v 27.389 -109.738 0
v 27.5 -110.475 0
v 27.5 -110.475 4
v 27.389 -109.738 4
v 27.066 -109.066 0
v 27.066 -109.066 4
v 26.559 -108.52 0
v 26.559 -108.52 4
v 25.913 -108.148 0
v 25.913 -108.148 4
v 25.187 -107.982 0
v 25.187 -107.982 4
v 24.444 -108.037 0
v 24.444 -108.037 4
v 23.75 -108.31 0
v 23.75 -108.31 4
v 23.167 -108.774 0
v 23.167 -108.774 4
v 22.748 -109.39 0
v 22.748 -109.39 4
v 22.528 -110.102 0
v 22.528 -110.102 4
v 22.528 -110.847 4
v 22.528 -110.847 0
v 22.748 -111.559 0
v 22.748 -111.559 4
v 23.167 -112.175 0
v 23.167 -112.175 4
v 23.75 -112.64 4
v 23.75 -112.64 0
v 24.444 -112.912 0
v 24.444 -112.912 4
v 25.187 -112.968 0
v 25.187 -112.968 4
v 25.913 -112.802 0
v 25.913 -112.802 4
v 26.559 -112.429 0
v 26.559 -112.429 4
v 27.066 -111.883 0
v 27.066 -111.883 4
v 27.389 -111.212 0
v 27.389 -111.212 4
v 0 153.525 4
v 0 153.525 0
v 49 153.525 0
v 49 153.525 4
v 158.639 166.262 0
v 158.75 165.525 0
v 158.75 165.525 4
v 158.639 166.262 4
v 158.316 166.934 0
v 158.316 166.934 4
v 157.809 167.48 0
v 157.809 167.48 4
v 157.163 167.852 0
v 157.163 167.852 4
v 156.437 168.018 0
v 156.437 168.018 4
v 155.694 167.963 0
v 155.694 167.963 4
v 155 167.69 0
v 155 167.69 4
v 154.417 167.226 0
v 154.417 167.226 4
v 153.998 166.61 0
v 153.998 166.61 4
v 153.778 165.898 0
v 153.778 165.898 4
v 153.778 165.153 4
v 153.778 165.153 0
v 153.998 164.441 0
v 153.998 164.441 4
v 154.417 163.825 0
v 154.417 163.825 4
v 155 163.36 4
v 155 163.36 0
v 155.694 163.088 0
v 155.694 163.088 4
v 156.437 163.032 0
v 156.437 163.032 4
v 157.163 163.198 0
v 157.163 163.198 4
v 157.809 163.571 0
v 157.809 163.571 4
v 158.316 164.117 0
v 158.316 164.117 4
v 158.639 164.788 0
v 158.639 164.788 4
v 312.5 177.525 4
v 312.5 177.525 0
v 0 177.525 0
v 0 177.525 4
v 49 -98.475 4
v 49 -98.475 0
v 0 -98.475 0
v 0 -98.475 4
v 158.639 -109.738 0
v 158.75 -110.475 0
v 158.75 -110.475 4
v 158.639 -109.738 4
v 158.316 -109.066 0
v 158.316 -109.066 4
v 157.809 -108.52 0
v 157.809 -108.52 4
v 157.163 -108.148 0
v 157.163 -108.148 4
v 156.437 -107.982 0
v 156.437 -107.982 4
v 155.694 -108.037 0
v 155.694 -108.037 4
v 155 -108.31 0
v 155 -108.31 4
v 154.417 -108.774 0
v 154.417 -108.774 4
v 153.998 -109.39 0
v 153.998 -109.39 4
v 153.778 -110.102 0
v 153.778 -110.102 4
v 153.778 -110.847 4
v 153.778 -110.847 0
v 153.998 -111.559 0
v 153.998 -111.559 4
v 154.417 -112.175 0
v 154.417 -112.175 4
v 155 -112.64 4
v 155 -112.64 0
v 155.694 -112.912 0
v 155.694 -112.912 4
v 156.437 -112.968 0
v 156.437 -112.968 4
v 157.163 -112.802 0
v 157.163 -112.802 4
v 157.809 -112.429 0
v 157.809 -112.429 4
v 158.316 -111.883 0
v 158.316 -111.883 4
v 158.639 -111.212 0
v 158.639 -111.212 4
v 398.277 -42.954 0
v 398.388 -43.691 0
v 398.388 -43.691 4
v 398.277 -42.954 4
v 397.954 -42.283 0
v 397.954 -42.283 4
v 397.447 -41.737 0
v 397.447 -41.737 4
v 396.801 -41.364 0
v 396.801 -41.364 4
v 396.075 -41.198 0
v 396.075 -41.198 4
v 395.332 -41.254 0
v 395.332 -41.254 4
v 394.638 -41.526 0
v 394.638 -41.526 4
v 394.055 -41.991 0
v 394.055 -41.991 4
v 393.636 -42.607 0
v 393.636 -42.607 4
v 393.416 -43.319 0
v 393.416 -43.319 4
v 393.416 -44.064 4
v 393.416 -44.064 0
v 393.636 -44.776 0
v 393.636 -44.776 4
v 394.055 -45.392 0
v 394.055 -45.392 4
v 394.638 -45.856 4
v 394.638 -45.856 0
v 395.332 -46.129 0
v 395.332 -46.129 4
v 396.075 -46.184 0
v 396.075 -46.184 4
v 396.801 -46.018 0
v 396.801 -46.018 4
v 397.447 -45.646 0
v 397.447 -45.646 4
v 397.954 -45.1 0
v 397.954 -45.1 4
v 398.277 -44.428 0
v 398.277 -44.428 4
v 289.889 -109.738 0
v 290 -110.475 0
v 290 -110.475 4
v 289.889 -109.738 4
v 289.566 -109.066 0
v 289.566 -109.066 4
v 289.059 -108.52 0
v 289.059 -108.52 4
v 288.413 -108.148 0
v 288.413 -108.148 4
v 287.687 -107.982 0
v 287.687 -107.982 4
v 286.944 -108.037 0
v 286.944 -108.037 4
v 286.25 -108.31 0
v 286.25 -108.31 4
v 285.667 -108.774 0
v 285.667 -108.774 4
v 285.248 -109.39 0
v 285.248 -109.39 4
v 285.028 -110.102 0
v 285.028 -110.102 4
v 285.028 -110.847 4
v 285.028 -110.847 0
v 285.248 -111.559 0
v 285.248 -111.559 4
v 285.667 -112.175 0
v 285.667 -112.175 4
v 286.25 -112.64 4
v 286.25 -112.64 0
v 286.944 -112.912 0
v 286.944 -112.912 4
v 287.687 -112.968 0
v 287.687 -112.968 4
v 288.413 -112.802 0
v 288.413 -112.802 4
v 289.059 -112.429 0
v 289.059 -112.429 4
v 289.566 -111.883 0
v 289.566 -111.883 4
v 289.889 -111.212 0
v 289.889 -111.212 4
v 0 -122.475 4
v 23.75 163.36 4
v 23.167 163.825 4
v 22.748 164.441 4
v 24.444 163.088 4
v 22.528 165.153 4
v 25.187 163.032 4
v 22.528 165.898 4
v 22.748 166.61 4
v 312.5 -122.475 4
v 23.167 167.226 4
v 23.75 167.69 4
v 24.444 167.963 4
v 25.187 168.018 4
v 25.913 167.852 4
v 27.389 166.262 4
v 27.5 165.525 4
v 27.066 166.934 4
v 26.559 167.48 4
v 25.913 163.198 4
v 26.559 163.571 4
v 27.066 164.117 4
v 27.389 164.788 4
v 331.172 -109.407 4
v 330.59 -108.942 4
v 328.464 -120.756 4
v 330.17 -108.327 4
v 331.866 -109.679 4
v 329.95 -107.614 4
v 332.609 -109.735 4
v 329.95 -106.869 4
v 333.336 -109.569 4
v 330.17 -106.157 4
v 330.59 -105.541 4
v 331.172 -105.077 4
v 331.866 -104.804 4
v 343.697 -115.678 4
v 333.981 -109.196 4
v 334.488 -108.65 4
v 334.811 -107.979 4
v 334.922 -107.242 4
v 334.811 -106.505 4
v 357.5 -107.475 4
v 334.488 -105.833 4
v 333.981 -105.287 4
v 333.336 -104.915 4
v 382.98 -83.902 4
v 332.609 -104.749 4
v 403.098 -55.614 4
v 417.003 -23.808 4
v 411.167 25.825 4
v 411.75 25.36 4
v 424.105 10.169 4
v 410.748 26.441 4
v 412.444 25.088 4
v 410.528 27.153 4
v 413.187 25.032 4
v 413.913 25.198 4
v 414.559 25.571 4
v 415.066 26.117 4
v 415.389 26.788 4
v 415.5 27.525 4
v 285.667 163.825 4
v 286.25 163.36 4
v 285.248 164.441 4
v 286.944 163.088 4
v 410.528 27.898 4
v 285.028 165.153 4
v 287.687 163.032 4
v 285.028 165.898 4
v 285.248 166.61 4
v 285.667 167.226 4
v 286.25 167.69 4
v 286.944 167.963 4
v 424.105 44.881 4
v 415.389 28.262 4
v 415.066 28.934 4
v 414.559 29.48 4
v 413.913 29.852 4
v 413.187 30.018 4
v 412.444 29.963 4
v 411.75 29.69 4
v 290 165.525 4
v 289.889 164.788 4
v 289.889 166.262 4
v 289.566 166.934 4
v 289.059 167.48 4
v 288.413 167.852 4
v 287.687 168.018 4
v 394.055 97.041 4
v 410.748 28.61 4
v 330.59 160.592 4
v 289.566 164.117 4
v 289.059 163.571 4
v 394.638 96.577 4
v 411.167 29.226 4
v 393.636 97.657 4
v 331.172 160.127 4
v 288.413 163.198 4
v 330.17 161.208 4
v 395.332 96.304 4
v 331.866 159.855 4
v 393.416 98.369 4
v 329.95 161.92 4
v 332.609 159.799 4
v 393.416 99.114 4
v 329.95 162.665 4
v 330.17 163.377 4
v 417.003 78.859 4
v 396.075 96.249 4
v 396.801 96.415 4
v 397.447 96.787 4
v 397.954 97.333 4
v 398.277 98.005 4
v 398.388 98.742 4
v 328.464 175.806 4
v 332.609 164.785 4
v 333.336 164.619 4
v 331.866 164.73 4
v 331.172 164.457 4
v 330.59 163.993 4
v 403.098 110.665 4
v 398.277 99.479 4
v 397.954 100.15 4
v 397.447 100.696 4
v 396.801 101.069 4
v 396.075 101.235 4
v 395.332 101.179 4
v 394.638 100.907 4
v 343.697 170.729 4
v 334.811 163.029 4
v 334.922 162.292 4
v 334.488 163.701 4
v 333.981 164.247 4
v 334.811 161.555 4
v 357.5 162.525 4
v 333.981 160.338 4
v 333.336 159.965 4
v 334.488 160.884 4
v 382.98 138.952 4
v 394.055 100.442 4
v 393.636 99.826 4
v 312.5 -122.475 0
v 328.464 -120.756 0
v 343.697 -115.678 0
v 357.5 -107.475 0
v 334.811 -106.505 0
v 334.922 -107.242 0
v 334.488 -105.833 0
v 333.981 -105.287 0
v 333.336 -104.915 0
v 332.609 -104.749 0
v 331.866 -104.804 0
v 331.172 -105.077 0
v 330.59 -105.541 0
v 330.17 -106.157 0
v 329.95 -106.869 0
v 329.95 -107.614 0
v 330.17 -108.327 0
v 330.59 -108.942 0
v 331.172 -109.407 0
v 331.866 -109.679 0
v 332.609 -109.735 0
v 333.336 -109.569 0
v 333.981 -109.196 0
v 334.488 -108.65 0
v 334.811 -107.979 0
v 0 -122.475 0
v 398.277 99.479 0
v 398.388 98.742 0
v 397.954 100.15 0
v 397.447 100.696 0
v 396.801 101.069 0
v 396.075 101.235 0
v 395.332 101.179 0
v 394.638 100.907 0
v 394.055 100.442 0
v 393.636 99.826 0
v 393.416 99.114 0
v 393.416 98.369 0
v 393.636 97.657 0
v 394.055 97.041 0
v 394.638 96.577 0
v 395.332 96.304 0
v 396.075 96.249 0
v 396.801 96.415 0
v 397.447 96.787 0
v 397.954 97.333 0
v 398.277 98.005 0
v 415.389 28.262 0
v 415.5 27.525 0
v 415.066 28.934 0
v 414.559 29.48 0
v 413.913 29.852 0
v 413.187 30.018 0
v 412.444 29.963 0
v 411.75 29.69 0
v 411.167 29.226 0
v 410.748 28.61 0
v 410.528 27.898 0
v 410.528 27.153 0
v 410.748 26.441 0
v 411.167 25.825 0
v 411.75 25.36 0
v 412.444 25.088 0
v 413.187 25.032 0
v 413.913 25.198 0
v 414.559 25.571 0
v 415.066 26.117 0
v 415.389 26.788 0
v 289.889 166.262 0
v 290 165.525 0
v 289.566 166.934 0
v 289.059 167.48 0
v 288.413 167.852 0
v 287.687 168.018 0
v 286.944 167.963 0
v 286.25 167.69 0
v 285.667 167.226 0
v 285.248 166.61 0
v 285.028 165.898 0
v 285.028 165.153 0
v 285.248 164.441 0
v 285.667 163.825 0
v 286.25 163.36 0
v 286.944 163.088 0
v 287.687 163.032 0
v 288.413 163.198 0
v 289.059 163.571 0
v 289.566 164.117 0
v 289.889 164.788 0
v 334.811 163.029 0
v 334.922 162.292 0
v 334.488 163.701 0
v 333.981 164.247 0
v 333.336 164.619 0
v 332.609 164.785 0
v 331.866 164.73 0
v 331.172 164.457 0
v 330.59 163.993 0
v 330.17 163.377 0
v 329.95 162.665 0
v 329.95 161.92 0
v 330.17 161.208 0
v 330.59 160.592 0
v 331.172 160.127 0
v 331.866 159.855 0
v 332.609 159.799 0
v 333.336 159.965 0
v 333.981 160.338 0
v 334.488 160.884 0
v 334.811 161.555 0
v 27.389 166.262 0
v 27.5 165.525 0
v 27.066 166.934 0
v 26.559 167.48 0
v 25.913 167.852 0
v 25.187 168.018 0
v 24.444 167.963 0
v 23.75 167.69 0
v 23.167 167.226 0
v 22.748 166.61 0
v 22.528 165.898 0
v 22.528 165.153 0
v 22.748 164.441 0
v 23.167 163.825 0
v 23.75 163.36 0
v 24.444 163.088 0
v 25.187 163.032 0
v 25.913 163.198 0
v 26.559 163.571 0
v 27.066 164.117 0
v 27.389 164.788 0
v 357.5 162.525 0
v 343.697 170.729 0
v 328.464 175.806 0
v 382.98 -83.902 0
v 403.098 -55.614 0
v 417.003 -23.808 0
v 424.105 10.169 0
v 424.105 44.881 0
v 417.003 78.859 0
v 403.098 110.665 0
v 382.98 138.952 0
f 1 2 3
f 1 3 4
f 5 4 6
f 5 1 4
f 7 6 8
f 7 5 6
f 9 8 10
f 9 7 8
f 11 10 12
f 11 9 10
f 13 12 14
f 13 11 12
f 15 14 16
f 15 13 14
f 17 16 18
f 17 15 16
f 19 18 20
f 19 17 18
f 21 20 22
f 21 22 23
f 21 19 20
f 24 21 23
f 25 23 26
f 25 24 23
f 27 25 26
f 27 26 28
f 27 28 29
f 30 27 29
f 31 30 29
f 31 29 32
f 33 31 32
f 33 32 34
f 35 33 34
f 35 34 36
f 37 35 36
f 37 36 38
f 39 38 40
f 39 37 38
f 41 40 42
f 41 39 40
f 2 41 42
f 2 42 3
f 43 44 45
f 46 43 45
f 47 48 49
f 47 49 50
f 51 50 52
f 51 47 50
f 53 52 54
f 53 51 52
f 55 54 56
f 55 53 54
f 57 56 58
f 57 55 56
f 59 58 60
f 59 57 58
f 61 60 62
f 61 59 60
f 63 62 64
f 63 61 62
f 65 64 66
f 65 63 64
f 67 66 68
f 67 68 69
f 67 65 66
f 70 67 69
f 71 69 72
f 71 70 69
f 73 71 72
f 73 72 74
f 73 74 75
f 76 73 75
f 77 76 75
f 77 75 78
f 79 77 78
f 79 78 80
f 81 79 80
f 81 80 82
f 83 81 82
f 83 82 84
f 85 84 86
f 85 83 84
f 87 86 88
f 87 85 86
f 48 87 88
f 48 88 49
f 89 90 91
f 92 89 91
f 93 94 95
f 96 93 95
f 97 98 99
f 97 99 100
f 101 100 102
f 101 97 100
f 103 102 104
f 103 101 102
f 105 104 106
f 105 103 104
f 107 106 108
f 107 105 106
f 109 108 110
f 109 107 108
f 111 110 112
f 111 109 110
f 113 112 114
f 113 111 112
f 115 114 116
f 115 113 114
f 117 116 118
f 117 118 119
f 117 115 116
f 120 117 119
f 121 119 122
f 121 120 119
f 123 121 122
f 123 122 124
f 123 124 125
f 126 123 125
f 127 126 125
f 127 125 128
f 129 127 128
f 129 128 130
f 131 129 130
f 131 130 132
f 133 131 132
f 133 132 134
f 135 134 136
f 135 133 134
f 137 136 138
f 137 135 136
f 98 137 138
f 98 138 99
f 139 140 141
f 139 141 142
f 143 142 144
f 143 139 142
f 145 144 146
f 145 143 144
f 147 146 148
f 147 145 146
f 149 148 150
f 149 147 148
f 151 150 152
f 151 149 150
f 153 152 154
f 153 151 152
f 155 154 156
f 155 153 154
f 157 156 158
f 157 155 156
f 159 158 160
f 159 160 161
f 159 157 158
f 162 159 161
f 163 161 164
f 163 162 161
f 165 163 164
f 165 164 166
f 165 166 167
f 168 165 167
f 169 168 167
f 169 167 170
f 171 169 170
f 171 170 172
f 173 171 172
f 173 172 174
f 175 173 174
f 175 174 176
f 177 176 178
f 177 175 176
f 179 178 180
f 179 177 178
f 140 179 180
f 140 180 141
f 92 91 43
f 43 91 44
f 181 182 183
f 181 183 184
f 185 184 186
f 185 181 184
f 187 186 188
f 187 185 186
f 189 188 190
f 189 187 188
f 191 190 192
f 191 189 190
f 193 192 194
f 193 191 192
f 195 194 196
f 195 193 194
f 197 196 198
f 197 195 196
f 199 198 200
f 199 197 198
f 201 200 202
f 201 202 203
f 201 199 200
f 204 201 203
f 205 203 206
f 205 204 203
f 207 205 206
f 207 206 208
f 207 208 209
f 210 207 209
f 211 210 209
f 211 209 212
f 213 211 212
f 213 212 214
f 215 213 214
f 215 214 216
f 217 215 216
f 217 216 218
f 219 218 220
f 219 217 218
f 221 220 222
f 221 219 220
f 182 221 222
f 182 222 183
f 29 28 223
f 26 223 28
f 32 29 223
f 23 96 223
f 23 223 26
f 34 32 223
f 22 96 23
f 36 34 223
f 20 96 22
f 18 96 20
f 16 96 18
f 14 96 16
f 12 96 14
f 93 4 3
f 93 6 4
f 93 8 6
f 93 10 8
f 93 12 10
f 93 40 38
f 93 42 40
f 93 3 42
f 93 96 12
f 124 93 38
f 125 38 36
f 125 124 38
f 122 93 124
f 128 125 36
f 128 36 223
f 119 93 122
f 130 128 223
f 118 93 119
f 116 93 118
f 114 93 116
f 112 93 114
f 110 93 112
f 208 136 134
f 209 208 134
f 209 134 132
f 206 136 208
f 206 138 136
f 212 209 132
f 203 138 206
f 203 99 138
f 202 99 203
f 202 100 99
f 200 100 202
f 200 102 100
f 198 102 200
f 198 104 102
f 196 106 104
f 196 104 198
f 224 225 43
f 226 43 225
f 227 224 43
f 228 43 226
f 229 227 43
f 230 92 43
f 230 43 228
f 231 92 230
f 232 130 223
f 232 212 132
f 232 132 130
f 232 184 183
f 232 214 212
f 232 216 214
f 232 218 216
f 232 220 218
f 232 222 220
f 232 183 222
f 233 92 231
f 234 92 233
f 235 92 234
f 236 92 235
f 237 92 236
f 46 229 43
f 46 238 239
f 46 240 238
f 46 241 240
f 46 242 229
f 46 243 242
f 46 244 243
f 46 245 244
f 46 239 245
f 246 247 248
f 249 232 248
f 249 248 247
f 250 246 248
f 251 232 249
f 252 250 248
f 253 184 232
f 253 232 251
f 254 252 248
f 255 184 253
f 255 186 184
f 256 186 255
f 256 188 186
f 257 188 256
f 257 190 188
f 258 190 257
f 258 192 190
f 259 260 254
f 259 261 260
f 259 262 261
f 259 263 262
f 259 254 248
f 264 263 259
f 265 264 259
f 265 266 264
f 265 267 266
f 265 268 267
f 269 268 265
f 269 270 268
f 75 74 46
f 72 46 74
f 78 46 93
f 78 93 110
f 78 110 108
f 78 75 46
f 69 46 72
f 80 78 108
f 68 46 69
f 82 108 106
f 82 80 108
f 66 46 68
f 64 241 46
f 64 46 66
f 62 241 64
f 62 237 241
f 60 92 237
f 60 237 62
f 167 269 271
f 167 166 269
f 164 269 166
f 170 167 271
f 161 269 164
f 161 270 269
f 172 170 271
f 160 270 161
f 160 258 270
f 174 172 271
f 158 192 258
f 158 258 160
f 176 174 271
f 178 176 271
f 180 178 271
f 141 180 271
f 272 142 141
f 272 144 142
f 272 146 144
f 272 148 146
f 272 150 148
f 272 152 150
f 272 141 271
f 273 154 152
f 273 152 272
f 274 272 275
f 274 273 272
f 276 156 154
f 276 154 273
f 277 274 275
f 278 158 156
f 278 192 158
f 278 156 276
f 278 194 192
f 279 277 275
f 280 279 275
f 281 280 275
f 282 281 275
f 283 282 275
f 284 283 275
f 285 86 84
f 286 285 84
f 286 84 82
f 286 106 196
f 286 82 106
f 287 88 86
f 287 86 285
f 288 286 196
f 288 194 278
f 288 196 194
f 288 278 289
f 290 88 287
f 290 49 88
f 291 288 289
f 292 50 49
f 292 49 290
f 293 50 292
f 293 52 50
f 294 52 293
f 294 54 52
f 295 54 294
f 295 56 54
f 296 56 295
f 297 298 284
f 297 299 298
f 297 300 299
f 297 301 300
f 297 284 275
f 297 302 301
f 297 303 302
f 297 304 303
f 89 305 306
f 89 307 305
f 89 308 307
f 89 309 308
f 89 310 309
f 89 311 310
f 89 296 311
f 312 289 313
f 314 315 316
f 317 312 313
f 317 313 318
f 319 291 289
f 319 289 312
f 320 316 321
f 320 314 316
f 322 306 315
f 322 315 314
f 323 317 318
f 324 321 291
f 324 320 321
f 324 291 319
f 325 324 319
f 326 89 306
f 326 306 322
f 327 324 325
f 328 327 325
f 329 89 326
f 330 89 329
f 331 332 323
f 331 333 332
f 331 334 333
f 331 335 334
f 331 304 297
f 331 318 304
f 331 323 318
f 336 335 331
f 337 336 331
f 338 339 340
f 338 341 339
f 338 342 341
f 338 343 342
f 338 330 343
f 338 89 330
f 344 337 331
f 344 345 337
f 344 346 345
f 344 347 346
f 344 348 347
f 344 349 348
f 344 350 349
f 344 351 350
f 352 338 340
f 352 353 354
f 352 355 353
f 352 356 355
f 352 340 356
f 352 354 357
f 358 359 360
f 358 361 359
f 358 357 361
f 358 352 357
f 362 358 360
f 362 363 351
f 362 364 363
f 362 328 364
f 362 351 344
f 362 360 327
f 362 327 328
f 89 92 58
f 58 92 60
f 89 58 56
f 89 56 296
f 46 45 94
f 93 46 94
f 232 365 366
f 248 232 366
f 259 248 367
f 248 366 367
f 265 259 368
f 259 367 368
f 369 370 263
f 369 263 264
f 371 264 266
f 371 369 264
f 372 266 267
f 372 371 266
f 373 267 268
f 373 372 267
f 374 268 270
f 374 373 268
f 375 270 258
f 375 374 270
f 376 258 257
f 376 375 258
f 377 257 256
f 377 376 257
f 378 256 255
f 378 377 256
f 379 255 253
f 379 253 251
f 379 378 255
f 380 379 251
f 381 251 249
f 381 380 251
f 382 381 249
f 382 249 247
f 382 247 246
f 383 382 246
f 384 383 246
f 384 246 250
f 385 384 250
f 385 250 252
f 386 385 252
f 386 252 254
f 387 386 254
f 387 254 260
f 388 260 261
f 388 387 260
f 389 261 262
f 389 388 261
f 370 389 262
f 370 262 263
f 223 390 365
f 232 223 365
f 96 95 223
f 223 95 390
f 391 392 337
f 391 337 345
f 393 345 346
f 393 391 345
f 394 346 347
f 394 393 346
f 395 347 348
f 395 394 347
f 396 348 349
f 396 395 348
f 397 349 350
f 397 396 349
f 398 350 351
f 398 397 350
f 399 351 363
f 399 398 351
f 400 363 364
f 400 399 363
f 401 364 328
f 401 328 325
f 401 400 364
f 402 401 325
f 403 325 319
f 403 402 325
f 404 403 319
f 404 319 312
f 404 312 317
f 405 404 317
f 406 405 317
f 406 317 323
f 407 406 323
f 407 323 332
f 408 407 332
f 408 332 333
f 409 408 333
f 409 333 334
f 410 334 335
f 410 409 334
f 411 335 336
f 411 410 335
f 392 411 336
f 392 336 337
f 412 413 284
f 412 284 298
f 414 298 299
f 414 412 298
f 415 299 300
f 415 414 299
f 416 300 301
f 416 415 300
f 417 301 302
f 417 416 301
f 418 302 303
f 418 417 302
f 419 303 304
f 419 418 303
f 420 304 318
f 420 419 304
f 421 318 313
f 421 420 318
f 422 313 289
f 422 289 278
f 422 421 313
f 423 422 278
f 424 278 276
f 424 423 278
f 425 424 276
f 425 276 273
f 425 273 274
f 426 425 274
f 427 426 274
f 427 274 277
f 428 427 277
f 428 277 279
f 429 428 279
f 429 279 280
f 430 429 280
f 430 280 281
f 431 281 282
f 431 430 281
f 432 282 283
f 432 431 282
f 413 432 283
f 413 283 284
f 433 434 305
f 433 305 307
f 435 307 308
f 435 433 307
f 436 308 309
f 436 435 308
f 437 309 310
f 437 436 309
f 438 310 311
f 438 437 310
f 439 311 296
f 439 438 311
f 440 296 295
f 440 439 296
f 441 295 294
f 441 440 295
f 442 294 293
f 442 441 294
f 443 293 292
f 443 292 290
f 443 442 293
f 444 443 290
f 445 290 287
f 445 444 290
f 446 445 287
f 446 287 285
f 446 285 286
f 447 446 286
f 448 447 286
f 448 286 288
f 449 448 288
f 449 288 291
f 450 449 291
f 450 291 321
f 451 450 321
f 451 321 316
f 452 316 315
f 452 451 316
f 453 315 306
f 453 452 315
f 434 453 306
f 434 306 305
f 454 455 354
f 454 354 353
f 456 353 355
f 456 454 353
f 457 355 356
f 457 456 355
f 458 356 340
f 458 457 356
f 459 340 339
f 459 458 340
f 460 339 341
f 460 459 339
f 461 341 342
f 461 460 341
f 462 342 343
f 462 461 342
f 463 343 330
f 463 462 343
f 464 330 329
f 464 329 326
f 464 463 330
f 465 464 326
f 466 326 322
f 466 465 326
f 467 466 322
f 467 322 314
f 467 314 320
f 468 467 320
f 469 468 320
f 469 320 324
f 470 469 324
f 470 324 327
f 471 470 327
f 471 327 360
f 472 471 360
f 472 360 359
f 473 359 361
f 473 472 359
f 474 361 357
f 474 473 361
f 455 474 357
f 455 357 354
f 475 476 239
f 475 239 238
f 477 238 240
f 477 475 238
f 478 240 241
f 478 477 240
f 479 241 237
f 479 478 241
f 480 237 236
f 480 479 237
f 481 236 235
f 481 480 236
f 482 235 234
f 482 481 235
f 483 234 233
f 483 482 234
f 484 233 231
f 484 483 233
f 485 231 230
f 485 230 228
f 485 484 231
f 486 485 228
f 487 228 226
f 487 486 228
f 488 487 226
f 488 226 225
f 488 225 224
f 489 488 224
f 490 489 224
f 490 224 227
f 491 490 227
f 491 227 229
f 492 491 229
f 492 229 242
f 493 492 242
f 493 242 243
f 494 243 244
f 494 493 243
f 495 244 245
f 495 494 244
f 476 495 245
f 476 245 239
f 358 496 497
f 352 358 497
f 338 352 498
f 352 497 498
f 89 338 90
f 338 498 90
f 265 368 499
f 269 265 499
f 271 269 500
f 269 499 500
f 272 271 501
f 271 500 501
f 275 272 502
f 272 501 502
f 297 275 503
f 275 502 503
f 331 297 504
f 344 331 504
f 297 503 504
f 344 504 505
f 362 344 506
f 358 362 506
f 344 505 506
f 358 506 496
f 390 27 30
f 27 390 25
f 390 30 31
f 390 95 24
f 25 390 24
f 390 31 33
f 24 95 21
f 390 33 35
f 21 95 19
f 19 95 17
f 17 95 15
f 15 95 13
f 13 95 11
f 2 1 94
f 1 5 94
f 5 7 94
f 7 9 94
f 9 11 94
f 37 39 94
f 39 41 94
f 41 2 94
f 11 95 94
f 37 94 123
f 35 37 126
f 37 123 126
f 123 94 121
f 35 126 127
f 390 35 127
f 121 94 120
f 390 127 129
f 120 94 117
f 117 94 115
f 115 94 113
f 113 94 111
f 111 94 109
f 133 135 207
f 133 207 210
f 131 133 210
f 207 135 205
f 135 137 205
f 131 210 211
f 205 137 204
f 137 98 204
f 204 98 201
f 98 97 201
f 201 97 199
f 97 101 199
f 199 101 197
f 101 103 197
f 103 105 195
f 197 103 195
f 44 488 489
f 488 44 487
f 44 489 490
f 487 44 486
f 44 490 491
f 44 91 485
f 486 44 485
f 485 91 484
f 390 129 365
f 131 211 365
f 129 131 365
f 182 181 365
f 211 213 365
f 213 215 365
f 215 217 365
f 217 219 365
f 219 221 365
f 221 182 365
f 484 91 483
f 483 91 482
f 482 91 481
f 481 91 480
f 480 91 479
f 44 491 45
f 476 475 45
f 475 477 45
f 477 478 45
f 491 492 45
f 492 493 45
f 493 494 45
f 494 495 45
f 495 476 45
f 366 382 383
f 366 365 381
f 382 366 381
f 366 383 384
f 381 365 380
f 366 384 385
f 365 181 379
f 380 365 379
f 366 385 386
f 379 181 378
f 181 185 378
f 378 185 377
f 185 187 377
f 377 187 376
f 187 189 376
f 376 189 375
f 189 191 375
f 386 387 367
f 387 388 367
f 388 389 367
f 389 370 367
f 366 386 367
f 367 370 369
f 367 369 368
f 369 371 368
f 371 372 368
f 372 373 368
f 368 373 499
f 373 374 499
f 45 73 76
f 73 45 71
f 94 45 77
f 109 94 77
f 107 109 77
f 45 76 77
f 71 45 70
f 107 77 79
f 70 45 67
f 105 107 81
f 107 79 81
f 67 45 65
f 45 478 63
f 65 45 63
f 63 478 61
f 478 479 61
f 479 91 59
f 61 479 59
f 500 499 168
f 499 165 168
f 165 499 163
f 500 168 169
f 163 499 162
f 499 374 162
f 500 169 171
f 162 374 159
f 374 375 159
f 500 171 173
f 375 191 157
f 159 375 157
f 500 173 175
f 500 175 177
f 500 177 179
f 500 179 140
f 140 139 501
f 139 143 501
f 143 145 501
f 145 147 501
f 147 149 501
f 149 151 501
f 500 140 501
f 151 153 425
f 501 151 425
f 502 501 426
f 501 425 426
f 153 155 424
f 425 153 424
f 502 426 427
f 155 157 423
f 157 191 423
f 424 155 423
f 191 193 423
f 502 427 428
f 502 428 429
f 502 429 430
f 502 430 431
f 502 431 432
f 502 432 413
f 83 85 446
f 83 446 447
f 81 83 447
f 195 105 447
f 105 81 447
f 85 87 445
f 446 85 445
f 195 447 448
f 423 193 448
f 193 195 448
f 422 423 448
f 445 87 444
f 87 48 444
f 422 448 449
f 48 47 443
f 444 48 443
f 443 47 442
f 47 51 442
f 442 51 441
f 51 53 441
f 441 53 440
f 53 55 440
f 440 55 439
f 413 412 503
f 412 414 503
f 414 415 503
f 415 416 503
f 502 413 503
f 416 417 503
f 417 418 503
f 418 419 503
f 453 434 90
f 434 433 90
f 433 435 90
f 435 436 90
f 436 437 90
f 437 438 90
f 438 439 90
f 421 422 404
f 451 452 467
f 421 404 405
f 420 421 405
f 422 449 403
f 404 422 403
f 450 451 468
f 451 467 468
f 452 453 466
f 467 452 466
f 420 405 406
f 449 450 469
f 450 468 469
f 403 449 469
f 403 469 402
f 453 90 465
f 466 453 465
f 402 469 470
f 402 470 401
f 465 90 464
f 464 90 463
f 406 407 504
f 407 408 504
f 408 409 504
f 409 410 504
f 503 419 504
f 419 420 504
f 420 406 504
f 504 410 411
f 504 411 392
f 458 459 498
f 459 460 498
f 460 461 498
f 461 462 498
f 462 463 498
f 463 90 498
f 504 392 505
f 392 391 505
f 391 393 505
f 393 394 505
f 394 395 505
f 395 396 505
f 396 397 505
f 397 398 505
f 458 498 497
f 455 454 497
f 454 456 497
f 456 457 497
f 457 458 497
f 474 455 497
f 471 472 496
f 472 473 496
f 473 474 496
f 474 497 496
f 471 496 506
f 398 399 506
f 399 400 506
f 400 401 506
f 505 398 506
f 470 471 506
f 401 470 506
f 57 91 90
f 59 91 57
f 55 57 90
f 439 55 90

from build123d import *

# Parameters (mm, degrees)
SKETCH1_R           = 2.5
BOSS_EXTRUDE1_DEPTH = 4


with BuildPart() as part:
    # Sketch1 → Boss-Extrude1 (new body)
    with BuildSketch(Plane.XY):
        with BuildLine():
            Line((0, -122.474747475), (312.5, -122.474747475))
            ThreePointArc((312.5, -122.474747475), (336.217082451, -118.625994829), (357.5, -107.474747475))
            ThreePointArc((357.5, -107.474747475), (425, 27.525252525), (357.5, 162.525252525))
            ThreePointArc((357.5, 162.525252525), (336.217082451, 173.676499879), (312.5, 177.525252525))
            Line((312.5, 177.525252525), (0, 177.525252525))
            Line((0, 177.525252525), (0, 153.525252525))
            Line((0, 153.525252525), (49, 153.525252525))
            Line((49, 153.525252525), (49, -98.474747475))
            Line((49, -98.474747475), (0, -98.474747475))
            Line((0, -98.474747475), (0, -122.474747475))
        make_face()
        with Locations((25, 165.525252525)):
            Circle(SKETCH1_R, mode=Mode.SUBTRACT)
        with Locations((156.25, 165.525252525)):
            Circle(SKETCH1_R, mode=Mode.SUBTRACT)
        with Locations((287.5, 165.525252525)):
            Circle(SKETCH1_R, mode=Mode.SUBTRACT)
        with Locations((332.422349259, 162.292300302)):
            Circle(SKETCH1_R, mode=Mode.SUBTRACT)
        with Locations((395.887987253, 98.741788638)):
            Circle(SKETCH1_R, mode=Mode.SUBTRACT)
        with Locations((413, 27.525252525)):
            Circle(SKETCH1_R, mode=Mode.SUBTRACT)
        with Locations((395.887987253, -43.691283587)):
            Circle(SKETCH1_R, mode=Mode.SUBTRACT)
        with Locations((332.422349259, -107.241795252)):
            Circle(SKETCH1_R, mode=Mode.SUBTRACT)
        with Locations((287.5, -110.474747475)):
            Circle(SKETCH1_R, mode=Mode.SUBTRACT)
        with Locations((156.25, -110.474747475)):
            Circle(SKETCH1_R, mode=Mode.SUBTRACT)
        with Locations((25, -110.474747475)):
            Circle(SKETCH1_R, mode=Mode.SUBTRACT)
    extrude(amount=BOSS_EXTRUDE1_DEPTH)


solid = part.part
